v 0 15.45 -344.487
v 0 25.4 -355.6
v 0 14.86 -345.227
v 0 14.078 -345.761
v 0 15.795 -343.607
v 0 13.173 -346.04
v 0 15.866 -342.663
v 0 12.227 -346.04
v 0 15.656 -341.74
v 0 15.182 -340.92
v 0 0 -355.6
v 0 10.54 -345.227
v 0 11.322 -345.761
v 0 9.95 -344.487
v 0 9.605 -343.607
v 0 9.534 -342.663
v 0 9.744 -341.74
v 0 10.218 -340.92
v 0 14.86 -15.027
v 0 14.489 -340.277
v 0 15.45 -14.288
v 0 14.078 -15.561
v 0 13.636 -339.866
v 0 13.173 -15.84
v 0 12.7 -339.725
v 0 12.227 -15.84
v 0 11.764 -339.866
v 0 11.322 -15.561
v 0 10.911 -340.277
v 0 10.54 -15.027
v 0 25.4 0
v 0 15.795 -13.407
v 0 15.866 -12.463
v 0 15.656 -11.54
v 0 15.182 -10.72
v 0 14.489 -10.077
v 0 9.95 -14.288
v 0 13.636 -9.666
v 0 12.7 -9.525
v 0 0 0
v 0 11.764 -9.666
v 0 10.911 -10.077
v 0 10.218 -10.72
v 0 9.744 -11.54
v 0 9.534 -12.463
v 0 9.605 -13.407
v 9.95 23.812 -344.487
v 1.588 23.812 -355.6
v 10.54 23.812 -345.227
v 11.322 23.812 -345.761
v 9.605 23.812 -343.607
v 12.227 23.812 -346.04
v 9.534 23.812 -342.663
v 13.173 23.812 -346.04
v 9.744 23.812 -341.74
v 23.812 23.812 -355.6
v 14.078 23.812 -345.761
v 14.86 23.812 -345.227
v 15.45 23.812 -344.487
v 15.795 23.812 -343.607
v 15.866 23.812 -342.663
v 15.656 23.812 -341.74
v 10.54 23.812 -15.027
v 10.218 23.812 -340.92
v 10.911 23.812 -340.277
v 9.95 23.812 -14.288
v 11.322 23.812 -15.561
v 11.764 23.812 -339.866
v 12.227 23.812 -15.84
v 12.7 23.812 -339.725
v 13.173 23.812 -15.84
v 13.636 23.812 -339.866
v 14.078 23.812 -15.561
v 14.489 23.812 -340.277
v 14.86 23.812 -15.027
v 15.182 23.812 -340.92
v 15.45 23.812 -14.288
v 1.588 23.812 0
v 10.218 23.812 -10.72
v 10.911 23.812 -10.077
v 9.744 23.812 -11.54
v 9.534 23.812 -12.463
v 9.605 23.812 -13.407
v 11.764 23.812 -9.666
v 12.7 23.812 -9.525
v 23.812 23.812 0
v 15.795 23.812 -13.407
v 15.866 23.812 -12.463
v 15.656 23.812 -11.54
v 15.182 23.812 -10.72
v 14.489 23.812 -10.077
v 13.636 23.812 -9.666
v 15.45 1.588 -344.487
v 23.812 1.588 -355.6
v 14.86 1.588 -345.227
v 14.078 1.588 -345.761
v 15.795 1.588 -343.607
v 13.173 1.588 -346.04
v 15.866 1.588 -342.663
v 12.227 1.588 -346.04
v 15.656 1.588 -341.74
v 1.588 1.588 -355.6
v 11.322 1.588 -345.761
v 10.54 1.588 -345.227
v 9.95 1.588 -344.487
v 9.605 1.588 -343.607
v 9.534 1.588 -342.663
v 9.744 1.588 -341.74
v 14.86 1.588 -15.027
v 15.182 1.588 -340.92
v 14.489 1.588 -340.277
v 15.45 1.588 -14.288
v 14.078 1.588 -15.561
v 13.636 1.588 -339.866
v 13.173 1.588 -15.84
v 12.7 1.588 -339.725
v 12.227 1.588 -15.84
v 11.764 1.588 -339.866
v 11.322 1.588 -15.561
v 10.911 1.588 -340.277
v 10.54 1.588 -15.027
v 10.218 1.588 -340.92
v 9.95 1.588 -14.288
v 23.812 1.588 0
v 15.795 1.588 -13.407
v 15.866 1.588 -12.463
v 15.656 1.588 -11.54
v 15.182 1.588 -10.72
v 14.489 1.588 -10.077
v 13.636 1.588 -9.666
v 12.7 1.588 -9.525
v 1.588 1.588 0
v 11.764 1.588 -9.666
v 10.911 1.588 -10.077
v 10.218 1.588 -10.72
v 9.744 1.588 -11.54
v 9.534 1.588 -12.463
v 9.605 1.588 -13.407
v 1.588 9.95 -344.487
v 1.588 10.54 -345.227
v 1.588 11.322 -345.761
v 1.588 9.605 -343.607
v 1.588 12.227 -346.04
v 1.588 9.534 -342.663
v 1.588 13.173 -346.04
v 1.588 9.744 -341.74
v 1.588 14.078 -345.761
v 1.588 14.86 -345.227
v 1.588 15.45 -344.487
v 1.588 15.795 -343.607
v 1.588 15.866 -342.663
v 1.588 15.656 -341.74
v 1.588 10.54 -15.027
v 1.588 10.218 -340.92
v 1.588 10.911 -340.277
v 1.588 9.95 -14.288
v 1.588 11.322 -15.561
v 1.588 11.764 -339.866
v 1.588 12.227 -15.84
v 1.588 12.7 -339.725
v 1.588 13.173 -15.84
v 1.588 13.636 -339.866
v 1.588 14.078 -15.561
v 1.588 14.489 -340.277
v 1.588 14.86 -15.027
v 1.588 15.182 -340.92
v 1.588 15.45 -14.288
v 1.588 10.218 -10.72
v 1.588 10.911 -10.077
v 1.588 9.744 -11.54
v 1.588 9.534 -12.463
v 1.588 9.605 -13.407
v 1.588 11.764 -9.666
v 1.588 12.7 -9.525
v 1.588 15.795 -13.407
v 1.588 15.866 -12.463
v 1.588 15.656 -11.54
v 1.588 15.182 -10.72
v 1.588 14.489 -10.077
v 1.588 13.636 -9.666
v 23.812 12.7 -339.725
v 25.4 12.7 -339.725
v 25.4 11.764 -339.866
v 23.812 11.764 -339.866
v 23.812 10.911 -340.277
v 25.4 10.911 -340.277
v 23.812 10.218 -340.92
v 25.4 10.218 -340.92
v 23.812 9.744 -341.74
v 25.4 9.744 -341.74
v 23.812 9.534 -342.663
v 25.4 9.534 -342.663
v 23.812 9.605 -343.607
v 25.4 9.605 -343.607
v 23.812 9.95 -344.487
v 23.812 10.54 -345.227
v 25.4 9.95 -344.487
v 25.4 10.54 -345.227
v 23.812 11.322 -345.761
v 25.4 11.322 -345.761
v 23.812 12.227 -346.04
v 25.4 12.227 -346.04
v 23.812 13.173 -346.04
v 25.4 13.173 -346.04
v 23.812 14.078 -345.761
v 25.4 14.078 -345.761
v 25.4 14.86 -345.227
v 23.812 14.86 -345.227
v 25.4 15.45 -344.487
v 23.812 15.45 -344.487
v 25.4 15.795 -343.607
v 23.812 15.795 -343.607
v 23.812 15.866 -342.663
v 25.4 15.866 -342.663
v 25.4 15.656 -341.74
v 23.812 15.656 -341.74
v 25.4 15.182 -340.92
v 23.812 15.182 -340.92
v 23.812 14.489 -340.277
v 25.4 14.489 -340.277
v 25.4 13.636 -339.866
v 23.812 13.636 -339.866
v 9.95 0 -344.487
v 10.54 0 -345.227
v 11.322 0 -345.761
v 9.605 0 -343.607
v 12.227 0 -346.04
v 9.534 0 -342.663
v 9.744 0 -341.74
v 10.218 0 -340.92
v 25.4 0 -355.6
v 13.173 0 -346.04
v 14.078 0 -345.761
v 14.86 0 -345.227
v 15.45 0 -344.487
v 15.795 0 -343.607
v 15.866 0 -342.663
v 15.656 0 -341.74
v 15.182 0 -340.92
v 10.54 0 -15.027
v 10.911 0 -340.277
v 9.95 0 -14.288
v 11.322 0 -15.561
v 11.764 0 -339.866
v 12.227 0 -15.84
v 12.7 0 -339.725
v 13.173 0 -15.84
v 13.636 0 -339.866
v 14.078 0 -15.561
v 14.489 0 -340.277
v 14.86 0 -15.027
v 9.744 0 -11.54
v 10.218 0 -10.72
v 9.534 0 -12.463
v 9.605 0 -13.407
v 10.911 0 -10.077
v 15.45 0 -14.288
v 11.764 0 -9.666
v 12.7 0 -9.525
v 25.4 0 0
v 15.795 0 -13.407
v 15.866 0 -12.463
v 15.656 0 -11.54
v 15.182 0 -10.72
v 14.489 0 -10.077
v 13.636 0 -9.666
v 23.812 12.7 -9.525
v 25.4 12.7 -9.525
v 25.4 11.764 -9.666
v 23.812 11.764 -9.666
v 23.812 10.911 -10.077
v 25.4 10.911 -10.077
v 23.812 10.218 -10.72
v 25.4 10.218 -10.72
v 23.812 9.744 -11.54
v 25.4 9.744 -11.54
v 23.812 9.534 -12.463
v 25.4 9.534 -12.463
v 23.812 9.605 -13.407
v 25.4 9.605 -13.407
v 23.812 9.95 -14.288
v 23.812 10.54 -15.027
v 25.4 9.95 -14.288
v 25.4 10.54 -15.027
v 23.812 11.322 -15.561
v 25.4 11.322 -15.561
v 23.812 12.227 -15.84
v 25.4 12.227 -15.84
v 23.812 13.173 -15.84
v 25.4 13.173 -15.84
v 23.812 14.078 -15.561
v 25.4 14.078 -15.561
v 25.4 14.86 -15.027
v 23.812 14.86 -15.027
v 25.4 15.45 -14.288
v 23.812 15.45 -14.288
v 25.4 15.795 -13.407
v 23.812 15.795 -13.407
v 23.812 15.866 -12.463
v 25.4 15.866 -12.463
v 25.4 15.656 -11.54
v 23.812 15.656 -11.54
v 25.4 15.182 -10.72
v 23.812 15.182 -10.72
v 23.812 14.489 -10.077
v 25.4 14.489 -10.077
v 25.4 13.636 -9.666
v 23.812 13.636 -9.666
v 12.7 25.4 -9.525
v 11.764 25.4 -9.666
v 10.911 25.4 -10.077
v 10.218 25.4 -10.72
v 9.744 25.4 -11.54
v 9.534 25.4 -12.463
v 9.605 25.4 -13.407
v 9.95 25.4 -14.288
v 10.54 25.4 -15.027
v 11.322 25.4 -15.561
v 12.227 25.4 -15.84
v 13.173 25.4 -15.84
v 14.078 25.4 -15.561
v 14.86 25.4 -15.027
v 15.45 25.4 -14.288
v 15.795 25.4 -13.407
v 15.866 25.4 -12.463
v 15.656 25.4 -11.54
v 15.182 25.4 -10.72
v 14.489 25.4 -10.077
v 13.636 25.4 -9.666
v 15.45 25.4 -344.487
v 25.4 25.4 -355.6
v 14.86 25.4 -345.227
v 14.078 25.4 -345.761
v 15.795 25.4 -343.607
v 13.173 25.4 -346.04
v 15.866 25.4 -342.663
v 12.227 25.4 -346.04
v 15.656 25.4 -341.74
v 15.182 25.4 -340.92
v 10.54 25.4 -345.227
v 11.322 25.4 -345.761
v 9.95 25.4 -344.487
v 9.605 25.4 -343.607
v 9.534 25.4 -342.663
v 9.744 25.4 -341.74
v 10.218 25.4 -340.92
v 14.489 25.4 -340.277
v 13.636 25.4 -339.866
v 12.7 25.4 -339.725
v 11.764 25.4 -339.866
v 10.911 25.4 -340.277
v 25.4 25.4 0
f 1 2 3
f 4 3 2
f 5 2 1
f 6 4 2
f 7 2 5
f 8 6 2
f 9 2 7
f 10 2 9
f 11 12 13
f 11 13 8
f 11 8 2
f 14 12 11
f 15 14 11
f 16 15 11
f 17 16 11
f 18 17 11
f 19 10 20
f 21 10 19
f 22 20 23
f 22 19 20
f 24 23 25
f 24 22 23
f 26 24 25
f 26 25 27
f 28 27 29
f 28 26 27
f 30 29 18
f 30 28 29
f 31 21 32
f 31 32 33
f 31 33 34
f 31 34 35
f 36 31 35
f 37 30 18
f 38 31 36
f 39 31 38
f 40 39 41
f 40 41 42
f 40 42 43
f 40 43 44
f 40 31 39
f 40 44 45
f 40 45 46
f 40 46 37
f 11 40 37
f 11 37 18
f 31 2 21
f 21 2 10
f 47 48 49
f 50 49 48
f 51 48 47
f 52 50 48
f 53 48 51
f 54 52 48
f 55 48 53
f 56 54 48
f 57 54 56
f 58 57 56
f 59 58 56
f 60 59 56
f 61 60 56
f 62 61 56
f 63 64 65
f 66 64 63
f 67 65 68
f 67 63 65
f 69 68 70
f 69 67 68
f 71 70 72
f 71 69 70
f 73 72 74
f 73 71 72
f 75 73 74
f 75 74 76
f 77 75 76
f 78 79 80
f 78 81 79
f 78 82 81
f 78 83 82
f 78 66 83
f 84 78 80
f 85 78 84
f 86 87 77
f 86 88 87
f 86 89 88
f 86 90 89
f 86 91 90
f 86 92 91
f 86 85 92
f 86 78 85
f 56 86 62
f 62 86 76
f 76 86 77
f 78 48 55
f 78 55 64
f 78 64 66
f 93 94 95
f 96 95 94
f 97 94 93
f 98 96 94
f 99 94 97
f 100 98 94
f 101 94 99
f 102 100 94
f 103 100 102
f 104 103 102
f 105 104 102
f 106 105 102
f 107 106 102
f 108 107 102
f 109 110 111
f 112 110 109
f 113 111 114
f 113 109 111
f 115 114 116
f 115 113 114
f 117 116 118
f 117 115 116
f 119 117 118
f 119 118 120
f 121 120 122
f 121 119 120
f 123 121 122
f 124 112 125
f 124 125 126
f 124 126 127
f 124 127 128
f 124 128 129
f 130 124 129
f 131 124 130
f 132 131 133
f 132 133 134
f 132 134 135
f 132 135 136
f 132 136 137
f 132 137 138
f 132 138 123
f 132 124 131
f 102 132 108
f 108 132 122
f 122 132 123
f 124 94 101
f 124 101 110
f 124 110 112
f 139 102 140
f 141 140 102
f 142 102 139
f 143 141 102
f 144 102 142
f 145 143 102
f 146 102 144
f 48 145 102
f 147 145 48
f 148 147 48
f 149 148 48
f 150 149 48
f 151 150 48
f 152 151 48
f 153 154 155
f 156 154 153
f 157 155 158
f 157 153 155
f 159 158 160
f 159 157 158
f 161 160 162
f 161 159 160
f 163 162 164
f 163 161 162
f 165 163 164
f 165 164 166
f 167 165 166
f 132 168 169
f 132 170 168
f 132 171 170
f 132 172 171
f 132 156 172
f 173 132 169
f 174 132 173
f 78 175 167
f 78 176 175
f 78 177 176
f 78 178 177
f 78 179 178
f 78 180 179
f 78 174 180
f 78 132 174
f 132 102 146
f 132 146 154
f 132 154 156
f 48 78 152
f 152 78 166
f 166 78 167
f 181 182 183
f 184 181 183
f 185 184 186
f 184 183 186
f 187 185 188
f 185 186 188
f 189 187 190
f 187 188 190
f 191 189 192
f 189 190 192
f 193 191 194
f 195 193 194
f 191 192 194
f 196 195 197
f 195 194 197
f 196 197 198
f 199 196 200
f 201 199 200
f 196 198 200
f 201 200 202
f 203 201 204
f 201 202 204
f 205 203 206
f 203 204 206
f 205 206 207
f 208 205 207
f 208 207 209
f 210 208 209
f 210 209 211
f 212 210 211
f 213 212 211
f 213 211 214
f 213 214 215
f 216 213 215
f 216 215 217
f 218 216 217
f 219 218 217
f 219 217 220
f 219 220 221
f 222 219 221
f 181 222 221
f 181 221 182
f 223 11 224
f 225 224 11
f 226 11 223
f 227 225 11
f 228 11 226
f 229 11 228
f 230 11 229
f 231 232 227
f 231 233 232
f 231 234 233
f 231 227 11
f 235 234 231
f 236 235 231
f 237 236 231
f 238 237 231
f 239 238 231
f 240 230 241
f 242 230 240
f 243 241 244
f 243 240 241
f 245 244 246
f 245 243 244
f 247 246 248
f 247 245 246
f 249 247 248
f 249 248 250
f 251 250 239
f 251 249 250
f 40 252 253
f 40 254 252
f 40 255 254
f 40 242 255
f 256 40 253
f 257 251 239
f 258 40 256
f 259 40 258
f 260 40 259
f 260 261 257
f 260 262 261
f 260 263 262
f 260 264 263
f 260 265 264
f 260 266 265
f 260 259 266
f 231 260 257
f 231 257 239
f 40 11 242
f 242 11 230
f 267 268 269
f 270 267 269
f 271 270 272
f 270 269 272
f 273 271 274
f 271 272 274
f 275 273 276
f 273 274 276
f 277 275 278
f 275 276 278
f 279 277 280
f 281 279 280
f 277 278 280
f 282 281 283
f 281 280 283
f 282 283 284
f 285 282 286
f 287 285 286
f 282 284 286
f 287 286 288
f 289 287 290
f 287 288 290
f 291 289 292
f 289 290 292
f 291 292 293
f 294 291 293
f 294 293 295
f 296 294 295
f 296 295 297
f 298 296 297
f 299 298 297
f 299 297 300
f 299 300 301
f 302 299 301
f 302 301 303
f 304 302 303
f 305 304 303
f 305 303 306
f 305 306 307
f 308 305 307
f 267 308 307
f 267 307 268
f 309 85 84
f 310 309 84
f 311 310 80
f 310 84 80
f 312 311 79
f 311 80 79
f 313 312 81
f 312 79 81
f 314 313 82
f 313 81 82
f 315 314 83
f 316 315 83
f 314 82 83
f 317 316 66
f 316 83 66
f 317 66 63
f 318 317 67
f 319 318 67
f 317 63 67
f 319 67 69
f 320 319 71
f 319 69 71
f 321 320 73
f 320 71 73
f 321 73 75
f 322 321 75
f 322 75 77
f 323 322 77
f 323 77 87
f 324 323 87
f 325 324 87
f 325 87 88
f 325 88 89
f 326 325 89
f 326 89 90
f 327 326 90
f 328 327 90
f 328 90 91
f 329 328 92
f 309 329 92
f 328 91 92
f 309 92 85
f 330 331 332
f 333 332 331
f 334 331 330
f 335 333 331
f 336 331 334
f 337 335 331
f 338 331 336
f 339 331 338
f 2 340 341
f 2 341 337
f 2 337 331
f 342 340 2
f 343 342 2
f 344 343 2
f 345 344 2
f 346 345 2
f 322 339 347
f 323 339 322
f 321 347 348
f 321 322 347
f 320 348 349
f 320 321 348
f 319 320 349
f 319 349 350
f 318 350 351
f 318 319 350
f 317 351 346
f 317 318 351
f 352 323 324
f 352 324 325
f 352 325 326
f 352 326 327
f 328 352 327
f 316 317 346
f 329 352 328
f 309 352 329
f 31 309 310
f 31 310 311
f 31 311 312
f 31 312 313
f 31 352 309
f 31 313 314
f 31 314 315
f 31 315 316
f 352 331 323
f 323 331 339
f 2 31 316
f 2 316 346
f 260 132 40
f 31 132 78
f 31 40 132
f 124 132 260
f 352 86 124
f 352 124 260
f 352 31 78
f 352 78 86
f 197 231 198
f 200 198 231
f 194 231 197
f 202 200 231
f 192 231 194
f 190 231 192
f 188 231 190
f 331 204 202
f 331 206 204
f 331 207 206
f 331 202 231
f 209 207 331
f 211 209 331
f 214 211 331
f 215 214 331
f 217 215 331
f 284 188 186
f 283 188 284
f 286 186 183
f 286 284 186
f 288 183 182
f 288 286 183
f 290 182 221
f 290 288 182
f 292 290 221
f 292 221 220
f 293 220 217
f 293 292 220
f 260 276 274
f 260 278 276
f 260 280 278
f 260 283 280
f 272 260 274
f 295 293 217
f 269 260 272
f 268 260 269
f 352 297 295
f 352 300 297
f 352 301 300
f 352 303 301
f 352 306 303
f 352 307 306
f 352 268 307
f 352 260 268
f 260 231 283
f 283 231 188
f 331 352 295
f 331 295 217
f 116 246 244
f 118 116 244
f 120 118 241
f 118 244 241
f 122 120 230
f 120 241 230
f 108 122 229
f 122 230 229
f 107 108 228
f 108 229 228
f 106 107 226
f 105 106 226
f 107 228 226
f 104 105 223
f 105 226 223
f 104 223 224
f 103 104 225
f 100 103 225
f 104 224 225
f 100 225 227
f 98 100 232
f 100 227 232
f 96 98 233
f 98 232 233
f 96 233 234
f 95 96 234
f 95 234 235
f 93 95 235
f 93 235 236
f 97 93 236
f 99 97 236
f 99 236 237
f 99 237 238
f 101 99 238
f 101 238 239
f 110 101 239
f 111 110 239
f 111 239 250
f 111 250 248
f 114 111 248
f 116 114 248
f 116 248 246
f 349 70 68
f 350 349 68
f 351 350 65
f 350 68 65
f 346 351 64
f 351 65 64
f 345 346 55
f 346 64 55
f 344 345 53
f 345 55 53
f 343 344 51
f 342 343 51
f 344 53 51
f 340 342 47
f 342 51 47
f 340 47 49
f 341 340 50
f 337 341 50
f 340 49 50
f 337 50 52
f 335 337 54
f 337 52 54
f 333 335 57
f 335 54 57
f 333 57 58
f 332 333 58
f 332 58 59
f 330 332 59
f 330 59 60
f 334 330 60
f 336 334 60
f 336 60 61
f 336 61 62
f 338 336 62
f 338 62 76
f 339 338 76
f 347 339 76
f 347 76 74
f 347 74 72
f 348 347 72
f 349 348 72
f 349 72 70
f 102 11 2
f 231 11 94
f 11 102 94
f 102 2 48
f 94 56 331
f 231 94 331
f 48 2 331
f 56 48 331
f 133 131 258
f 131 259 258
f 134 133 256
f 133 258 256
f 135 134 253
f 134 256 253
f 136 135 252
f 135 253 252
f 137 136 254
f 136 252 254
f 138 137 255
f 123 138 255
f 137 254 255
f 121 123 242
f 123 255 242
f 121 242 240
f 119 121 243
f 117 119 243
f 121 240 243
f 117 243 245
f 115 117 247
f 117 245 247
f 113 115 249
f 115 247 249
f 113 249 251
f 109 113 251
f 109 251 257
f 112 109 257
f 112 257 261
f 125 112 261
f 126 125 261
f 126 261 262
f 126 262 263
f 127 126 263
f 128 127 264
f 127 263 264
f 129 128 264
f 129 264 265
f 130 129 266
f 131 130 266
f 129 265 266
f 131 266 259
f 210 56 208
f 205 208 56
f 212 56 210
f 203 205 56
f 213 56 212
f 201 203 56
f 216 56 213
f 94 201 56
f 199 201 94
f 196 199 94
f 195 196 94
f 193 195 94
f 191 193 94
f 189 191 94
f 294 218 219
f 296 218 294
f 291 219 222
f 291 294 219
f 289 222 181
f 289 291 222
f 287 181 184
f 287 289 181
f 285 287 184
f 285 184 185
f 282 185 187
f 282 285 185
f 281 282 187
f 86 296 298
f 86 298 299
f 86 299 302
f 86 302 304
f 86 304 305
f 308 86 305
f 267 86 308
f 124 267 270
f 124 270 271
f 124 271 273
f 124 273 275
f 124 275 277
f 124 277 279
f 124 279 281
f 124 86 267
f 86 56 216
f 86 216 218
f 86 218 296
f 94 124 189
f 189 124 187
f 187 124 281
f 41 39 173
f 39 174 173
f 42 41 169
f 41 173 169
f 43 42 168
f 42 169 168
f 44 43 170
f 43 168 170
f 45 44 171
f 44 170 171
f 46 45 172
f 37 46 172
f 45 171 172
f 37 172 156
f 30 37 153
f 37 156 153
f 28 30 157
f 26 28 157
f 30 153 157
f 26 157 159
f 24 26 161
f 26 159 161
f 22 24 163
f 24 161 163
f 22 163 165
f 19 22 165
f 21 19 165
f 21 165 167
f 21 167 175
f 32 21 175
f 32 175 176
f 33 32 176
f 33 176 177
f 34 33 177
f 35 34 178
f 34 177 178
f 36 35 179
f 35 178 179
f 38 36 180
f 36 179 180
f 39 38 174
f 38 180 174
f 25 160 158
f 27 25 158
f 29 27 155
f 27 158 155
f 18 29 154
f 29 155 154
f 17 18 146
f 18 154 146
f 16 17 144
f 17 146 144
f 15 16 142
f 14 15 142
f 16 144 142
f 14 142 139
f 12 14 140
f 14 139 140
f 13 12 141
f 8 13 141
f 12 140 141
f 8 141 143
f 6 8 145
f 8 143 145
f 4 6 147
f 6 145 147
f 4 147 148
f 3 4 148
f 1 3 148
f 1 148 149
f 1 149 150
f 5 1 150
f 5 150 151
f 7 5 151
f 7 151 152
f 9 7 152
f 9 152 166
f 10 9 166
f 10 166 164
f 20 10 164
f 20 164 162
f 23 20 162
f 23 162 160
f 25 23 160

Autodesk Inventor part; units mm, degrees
ref_plane "YZ Plane" through (0, 0, 0) normal (1, 0, 0) x (0, 1, 0)
ref_plane "XZ Plane" through (0, 0, 0) normal (0, 1, 0) x (-1, 0, 0)
ref_plane "XY Plane" through (0, 0, 0) normal (0, 0, 1) x (1, 0, 0)
sketch "Sketch1" plane through (0, 0, 0) normal (0, 0, 1) x (1, 0, 0)
  line L0 (0, 0) -> (25.4, 0)
  line L1 (25.4, 0) -> (25.4, 25.4)
  line L2 (25.4, 25.4) -> (0, 25.4)
  line L3 (0, 25.4) -> (0, 0)
  line L4 (1.5875, 23.8125) -> (23.8125, 23.8125)
  line L5 (23.8125, 23.8125) -> (23.8125, 1.5875)
  line L6 (23.8125, 1.5875) -> (1.5875, 1.5875)
  line L7 (1.5875, 1.5875) -> (1.5875, 23.8125)
  dimension "d0" = 25.4
  dimension "d1" = 25.4
  dimension "d2" = 1.5875
extrude "Extrusion1" add sketch "Sketch1" against normal blind 355.6
sketch "Sketch2" plane through (0, 0, 0) normal (-1, 0, 0) x (0, 0, 1)
  line L0 (-355.6, 25.4) -> (-355.6, 0) projected
  line L1 (0, 0) -> (-355.6, 0) projected
  line L2 (0, 25.4) -> (0, 0) projected
  point P0 (-12.7, 12.7)
  point P1 (-342.9, 12.7)
  dimension "d5" = 12.7
  dimension "d6" = 12.7
  dimension "d7" = 12.7
hole "Hole1" at (0, 12.7, -12.7) at (0, 12.7, -342.9) direction (1, 0, 0) diameter 6.35 depth 25.4 tip angle 118
sketch "Sketch3" plane through (0, 25.4, 0) normal (0, 1, 0) x (1, 0, 0)
  line L0 (25.4, 355.6) -> (0, 355.6) projected
  line L1 (25.4, 0) -> (0, 0) projected
  point P0 (12.7, 12.7)
  point P1 (12.7, 342.9)
  dimension "d15" = 12.7
  dimension "d16" = 12.7
hole "Hole2" at (12.7, 25.4, -12.7) at (12.7, 25.4, -342.9) direction (0, -1, 0) diameter 6.35 depth 25.4 tip angle 118
properties part number "1tube_14_layer1_inside"
